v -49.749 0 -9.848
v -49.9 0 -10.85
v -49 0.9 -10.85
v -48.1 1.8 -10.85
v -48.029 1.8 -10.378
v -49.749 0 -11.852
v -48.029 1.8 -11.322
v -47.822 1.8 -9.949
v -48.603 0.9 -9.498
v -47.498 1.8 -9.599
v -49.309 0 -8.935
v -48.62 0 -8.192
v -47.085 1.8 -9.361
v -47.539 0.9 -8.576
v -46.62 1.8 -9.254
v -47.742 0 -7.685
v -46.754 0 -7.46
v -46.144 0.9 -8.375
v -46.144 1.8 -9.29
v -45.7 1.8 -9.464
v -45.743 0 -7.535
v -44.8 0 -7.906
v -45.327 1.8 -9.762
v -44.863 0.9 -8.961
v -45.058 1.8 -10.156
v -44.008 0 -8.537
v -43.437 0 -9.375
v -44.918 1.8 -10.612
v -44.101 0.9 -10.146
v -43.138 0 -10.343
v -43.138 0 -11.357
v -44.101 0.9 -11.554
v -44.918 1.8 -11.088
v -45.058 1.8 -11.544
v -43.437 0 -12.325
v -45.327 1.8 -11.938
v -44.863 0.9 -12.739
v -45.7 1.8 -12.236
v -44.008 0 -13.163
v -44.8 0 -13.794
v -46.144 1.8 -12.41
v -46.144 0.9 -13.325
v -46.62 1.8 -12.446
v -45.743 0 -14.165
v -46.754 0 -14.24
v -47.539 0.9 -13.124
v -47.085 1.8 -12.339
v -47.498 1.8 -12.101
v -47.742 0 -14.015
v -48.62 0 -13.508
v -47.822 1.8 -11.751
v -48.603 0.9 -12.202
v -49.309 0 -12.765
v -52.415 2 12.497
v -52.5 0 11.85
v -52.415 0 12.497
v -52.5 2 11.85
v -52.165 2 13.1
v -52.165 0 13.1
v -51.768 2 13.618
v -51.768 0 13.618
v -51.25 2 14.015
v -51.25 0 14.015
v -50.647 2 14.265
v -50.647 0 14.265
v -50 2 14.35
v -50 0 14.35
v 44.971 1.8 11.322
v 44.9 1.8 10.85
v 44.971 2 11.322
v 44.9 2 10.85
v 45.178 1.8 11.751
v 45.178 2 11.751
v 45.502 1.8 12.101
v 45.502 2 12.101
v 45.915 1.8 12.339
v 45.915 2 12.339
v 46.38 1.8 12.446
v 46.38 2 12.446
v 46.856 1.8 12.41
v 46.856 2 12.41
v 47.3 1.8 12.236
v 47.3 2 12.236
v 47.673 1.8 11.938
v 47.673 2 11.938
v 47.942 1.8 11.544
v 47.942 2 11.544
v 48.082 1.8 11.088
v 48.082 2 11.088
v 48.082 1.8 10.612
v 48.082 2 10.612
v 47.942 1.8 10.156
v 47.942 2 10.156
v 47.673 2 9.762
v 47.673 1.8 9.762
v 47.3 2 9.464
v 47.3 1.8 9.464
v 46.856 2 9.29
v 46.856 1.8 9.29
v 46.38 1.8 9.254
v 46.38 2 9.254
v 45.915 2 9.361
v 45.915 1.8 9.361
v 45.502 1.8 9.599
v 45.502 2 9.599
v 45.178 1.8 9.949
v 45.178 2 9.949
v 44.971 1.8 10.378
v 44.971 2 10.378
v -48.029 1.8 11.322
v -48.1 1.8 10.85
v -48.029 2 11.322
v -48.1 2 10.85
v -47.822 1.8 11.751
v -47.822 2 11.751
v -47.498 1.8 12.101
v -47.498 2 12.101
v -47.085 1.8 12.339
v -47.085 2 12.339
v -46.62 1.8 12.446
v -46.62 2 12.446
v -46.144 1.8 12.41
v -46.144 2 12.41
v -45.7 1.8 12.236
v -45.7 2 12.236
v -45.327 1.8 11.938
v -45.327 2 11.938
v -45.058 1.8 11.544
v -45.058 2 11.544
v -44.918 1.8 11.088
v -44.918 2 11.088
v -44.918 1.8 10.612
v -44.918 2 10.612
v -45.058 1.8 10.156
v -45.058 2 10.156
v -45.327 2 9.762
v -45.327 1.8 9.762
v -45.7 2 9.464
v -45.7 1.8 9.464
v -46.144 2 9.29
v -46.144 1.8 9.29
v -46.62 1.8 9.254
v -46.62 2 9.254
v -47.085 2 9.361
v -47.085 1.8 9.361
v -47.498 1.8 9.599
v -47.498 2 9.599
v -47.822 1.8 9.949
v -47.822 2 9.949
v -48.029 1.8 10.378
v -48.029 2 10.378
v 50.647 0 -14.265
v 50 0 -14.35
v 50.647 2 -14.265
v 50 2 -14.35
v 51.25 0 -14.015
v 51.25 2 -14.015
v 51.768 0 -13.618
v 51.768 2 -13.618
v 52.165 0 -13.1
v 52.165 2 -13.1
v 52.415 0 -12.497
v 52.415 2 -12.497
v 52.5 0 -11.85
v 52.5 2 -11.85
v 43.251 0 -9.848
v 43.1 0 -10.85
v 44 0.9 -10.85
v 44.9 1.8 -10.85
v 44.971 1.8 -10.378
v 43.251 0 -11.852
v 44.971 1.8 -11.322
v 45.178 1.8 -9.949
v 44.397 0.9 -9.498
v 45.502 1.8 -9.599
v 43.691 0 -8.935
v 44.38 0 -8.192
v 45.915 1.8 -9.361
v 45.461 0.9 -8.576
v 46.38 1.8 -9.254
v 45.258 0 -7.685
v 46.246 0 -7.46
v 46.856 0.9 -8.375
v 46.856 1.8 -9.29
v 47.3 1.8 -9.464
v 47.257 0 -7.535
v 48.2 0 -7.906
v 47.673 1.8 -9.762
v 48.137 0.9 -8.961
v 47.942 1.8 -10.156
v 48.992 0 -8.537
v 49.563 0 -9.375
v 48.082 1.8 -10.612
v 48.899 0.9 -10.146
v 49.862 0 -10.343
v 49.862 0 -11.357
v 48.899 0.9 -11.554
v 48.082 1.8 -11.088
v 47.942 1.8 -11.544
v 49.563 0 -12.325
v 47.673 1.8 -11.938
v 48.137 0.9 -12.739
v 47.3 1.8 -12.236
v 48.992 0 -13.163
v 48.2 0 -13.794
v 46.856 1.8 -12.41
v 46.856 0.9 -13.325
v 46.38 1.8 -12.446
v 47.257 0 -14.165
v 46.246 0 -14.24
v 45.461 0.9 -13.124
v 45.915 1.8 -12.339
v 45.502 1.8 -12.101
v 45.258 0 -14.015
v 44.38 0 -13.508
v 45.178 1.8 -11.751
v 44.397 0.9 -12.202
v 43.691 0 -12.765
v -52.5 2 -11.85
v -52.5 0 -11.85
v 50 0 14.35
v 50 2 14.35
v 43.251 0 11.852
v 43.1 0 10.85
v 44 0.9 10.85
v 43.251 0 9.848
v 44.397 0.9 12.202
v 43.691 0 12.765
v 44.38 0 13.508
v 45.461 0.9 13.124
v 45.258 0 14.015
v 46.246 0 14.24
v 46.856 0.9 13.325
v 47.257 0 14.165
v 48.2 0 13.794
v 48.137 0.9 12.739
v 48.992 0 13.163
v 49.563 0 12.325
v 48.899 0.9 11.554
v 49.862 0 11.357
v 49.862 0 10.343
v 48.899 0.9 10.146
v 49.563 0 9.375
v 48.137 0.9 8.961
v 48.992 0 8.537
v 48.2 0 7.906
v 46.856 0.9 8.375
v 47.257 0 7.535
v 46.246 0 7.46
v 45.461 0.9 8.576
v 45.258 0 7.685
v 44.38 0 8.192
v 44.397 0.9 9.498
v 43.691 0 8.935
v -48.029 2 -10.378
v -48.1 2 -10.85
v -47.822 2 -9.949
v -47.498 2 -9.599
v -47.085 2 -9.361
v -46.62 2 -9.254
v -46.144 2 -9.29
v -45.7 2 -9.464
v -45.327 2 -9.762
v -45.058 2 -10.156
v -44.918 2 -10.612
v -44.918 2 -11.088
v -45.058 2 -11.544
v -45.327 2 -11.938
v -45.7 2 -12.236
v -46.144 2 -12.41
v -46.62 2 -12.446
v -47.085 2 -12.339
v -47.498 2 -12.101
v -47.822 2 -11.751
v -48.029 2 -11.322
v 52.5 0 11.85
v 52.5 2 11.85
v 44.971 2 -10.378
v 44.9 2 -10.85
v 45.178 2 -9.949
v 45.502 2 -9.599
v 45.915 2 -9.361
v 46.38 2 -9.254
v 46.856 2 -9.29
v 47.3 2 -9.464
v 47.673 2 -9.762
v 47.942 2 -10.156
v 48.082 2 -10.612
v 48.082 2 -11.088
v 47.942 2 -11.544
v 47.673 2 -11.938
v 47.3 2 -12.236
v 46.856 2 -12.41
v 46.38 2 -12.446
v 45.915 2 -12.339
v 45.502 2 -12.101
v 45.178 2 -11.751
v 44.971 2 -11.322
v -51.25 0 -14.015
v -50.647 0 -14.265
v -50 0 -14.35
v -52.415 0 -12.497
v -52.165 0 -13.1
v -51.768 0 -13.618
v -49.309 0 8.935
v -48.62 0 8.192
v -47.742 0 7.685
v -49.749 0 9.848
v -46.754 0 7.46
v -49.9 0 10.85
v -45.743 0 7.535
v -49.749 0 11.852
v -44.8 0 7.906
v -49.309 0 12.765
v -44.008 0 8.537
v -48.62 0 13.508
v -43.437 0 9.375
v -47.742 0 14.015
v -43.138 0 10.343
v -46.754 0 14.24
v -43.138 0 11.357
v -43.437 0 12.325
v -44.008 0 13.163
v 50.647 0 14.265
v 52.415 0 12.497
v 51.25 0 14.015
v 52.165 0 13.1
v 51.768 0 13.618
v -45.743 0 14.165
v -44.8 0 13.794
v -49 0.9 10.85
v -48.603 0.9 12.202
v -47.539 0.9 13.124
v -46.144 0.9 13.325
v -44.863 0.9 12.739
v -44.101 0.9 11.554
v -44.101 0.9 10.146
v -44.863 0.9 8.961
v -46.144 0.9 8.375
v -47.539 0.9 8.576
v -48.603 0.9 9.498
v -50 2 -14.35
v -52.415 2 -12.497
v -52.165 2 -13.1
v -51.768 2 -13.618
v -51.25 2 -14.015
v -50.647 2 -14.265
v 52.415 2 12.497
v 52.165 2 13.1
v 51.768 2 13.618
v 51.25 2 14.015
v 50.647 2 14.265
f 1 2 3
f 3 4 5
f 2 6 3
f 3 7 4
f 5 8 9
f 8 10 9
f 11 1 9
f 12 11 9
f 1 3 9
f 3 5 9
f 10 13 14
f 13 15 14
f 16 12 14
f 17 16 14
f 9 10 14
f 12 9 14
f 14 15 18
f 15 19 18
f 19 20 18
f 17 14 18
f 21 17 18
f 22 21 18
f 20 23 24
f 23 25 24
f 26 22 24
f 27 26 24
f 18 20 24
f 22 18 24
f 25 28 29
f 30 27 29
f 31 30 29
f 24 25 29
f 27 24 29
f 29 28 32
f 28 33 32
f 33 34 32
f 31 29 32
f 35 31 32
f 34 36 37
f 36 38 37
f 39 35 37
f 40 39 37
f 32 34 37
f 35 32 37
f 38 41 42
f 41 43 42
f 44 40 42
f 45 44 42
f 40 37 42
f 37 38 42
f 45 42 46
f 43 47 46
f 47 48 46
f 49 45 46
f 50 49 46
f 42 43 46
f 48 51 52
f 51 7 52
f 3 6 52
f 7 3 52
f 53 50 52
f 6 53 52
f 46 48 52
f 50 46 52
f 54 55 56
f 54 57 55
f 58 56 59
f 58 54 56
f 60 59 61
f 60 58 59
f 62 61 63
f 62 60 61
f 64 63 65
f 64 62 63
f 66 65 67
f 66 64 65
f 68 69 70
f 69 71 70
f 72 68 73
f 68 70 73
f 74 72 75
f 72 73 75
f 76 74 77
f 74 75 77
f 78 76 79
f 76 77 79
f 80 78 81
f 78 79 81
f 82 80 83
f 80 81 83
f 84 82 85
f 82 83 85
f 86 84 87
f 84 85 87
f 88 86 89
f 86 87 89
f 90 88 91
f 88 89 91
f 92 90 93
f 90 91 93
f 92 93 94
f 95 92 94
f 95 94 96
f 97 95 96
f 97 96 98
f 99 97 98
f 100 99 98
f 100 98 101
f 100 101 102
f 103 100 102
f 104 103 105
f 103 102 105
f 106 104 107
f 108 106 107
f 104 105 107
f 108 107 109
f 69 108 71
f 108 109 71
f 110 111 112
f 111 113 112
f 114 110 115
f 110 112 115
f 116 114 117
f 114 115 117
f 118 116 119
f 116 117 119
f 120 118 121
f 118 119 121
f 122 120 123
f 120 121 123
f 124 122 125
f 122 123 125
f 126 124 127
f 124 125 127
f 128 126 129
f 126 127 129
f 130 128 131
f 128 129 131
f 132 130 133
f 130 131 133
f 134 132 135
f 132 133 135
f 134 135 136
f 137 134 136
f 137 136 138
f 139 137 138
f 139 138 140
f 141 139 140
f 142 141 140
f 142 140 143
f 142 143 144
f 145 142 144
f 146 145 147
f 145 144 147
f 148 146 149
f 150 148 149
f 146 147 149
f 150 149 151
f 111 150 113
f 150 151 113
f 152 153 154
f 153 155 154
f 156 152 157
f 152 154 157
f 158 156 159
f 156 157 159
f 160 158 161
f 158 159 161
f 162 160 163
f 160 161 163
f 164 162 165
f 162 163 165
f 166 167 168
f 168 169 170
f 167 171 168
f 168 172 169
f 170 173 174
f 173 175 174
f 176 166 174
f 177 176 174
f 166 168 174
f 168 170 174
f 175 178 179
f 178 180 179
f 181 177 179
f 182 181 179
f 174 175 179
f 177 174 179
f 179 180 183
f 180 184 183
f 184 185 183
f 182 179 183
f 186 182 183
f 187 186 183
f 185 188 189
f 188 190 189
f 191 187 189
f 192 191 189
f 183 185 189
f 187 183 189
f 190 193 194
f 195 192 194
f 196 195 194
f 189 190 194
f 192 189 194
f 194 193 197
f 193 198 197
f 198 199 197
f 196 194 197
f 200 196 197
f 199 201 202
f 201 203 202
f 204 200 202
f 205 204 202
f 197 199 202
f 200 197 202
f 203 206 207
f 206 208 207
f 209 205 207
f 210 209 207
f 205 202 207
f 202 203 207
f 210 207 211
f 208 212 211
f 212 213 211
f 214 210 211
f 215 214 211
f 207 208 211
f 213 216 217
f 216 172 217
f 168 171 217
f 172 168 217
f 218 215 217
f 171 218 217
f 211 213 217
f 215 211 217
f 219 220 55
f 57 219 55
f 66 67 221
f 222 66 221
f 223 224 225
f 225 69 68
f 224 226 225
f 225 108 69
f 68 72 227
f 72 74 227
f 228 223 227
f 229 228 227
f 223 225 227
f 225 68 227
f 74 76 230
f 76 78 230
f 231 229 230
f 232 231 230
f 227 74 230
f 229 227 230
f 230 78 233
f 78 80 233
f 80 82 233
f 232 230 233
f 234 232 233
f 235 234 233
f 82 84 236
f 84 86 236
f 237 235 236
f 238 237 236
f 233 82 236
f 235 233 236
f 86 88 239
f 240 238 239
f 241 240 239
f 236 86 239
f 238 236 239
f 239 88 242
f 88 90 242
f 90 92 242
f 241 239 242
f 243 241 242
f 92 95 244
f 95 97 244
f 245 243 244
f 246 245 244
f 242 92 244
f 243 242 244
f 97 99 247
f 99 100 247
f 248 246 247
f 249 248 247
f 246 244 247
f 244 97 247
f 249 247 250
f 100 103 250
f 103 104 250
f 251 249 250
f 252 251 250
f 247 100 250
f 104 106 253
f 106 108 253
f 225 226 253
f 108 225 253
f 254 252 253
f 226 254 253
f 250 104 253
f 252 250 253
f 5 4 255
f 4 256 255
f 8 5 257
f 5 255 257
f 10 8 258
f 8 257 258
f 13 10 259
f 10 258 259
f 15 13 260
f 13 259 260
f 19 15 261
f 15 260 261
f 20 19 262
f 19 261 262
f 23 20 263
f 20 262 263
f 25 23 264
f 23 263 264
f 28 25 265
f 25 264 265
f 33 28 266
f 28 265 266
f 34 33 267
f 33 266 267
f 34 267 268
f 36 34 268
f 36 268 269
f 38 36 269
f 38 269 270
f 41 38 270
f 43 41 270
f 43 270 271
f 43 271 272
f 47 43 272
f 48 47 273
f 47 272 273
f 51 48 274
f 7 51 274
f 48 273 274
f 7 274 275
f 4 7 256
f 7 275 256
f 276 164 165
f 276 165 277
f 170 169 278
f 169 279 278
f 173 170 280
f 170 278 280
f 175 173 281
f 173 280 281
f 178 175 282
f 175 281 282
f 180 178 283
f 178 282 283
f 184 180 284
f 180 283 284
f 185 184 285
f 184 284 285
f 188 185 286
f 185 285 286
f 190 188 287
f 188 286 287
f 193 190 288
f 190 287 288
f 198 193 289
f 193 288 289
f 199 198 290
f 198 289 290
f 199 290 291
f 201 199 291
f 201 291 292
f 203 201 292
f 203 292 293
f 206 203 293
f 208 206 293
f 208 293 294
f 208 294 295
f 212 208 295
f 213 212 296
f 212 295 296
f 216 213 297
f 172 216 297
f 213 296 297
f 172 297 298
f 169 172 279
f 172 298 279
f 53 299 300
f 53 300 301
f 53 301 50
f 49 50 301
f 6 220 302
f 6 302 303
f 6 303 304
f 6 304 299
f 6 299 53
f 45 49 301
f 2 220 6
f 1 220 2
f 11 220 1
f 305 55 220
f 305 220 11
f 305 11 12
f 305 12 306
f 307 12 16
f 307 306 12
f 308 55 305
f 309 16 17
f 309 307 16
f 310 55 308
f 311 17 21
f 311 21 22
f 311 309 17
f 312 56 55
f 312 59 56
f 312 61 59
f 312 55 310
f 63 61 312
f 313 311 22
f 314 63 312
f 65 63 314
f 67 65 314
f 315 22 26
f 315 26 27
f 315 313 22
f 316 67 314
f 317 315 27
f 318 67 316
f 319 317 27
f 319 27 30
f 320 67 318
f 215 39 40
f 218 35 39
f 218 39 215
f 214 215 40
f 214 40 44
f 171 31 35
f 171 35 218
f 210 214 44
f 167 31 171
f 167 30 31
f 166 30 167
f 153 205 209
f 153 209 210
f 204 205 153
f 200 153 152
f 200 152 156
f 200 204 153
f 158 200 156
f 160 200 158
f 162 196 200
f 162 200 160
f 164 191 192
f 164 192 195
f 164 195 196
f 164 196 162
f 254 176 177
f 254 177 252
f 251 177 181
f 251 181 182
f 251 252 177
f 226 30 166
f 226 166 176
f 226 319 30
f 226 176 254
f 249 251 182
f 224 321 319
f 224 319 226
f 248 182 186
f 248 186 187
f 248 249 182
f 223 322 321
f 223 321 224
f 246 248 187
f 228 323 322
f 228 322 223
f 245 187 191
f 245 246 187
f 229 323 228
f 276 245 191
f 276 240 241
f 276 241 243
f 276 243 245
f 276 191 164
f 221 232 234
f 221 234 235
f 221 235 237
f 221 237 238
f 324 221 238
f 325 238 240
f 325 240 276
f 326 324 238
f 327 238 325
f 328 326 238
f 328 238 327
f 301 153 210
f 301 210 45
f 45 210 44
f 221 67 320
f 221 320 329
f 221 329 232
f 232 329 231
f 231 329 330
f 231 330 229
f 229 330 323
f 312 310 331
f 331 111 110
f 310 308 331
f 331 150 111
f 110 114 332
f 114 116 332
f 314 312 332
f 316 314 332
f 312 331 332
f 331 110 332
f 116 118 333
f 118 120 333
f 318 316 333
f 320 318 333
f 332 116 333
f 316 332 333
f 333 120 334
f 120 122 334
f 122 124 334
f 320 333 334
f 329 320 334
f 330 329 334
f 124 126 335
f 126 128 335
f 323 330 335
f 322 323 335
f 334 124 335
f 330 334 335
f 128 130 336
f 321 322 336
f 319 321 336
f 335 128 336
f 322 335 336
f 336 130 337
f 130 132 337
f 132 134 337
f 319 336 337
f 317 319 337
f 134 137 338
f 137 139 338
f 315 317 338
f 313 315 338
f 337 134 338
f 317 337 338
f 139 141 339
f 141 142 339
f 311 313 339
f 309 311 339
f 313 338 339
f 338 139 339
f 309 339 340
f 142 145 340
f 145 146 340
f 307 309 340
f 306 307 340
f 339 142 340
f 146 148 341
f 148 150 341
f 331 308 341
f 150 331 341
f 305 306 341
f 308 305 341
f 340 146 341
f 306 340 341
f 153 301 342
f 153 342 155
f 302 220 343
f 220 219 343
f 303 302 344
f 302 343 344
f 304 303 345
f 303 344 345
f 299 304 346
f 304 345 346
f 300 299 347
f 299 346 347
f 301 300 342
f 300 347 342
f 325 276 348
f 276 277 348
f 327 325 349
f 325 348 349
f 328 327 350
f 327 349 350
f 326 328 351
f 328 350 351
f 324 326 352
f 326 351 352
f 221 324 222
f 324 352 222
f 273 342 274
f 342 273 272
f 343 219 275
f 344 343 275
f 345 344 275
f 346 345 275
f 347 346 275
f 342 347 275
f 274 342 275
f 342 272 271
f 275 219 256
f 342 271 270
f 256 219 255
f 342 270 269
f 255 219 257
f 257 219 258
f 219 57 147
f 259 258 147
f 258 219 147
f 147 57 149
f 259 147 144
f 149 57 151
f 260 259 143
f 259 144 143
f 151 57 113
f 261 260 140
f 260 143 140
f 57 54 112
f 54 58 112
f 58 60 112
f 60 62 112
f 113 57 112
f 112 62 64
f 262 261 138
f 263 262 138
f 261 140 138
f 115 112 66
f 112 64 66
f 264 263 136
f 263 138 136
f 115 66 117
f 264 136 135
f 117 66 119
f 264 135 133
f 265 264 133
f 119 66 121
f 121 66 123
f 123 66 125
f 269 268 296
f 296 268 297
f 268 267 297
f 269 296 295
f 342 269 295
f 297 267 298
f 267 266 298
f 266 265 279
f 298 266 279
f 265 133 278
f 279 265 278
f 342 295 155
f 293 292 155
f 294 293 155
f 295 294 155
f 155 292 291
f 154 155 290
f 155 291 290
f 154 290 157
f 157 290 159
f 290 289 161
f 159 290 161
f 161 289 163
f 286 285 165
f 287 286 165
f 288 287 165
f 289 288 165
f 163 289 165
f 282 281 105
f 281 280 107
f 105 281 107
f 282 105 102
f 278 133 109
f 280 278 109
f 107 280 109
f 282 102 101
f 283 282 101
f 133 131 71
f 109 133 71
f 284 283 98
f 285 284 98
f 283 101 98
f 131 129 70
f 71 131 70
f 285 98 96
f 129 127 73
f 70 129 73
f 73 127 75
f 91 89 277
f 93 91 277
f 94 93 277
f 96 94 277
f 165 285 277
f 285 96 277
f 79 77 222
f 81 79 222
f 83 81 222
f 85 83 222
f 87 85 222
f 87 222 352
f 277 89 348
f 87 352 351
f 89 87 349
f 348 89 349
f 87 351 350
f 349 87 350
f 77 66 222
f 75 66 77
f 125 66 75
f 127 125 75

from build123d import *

# Parameters (mm, degrees)
SKETCH_W         = 105
SKETCH_H         = 28.7
PAD_DEPTH        = 2
FILLET_R         = 2.5
HOLE_D           = 3.2
HOLE_DEPTH       = 25
HOLE_CSINK_D     = 6.8
HOLE_CSINK_ANGLE = 90


with BuildPart() as part:
    # Sketch → Pad (new body)
    with BuildSketch(Plane.XZ):
        Rectangle(SKETCH_W, SKETCH_H)
    extrude(amount=-PAD_DEPTH)

    # Fillet
    fillet_edges = [part.edges().sort_by_distance(p)[0] for p in [
        (52.5, 1, 14.35),
        (52.5, 1, -14.35),
        (-52.5, 1, 14.35),
        (-52.5, 1, -14.35),
    ]]
    fillet(fillet_edges, radius=FILLET_R)

    # Hole
    with Locations(Plane.XZ):
        with Locations((46.5, 10.85), (46.5, -10.85), (-46.5, -10.85), (-46.5, 10.85)):
            CounterSinkHole(HOLE_D / 2, HOLE_CSINK_D / 2, depth=HOLE_DEPTH, counter_sink_angle=HOLE_CSINK_ANGLE)


solid = part.part
